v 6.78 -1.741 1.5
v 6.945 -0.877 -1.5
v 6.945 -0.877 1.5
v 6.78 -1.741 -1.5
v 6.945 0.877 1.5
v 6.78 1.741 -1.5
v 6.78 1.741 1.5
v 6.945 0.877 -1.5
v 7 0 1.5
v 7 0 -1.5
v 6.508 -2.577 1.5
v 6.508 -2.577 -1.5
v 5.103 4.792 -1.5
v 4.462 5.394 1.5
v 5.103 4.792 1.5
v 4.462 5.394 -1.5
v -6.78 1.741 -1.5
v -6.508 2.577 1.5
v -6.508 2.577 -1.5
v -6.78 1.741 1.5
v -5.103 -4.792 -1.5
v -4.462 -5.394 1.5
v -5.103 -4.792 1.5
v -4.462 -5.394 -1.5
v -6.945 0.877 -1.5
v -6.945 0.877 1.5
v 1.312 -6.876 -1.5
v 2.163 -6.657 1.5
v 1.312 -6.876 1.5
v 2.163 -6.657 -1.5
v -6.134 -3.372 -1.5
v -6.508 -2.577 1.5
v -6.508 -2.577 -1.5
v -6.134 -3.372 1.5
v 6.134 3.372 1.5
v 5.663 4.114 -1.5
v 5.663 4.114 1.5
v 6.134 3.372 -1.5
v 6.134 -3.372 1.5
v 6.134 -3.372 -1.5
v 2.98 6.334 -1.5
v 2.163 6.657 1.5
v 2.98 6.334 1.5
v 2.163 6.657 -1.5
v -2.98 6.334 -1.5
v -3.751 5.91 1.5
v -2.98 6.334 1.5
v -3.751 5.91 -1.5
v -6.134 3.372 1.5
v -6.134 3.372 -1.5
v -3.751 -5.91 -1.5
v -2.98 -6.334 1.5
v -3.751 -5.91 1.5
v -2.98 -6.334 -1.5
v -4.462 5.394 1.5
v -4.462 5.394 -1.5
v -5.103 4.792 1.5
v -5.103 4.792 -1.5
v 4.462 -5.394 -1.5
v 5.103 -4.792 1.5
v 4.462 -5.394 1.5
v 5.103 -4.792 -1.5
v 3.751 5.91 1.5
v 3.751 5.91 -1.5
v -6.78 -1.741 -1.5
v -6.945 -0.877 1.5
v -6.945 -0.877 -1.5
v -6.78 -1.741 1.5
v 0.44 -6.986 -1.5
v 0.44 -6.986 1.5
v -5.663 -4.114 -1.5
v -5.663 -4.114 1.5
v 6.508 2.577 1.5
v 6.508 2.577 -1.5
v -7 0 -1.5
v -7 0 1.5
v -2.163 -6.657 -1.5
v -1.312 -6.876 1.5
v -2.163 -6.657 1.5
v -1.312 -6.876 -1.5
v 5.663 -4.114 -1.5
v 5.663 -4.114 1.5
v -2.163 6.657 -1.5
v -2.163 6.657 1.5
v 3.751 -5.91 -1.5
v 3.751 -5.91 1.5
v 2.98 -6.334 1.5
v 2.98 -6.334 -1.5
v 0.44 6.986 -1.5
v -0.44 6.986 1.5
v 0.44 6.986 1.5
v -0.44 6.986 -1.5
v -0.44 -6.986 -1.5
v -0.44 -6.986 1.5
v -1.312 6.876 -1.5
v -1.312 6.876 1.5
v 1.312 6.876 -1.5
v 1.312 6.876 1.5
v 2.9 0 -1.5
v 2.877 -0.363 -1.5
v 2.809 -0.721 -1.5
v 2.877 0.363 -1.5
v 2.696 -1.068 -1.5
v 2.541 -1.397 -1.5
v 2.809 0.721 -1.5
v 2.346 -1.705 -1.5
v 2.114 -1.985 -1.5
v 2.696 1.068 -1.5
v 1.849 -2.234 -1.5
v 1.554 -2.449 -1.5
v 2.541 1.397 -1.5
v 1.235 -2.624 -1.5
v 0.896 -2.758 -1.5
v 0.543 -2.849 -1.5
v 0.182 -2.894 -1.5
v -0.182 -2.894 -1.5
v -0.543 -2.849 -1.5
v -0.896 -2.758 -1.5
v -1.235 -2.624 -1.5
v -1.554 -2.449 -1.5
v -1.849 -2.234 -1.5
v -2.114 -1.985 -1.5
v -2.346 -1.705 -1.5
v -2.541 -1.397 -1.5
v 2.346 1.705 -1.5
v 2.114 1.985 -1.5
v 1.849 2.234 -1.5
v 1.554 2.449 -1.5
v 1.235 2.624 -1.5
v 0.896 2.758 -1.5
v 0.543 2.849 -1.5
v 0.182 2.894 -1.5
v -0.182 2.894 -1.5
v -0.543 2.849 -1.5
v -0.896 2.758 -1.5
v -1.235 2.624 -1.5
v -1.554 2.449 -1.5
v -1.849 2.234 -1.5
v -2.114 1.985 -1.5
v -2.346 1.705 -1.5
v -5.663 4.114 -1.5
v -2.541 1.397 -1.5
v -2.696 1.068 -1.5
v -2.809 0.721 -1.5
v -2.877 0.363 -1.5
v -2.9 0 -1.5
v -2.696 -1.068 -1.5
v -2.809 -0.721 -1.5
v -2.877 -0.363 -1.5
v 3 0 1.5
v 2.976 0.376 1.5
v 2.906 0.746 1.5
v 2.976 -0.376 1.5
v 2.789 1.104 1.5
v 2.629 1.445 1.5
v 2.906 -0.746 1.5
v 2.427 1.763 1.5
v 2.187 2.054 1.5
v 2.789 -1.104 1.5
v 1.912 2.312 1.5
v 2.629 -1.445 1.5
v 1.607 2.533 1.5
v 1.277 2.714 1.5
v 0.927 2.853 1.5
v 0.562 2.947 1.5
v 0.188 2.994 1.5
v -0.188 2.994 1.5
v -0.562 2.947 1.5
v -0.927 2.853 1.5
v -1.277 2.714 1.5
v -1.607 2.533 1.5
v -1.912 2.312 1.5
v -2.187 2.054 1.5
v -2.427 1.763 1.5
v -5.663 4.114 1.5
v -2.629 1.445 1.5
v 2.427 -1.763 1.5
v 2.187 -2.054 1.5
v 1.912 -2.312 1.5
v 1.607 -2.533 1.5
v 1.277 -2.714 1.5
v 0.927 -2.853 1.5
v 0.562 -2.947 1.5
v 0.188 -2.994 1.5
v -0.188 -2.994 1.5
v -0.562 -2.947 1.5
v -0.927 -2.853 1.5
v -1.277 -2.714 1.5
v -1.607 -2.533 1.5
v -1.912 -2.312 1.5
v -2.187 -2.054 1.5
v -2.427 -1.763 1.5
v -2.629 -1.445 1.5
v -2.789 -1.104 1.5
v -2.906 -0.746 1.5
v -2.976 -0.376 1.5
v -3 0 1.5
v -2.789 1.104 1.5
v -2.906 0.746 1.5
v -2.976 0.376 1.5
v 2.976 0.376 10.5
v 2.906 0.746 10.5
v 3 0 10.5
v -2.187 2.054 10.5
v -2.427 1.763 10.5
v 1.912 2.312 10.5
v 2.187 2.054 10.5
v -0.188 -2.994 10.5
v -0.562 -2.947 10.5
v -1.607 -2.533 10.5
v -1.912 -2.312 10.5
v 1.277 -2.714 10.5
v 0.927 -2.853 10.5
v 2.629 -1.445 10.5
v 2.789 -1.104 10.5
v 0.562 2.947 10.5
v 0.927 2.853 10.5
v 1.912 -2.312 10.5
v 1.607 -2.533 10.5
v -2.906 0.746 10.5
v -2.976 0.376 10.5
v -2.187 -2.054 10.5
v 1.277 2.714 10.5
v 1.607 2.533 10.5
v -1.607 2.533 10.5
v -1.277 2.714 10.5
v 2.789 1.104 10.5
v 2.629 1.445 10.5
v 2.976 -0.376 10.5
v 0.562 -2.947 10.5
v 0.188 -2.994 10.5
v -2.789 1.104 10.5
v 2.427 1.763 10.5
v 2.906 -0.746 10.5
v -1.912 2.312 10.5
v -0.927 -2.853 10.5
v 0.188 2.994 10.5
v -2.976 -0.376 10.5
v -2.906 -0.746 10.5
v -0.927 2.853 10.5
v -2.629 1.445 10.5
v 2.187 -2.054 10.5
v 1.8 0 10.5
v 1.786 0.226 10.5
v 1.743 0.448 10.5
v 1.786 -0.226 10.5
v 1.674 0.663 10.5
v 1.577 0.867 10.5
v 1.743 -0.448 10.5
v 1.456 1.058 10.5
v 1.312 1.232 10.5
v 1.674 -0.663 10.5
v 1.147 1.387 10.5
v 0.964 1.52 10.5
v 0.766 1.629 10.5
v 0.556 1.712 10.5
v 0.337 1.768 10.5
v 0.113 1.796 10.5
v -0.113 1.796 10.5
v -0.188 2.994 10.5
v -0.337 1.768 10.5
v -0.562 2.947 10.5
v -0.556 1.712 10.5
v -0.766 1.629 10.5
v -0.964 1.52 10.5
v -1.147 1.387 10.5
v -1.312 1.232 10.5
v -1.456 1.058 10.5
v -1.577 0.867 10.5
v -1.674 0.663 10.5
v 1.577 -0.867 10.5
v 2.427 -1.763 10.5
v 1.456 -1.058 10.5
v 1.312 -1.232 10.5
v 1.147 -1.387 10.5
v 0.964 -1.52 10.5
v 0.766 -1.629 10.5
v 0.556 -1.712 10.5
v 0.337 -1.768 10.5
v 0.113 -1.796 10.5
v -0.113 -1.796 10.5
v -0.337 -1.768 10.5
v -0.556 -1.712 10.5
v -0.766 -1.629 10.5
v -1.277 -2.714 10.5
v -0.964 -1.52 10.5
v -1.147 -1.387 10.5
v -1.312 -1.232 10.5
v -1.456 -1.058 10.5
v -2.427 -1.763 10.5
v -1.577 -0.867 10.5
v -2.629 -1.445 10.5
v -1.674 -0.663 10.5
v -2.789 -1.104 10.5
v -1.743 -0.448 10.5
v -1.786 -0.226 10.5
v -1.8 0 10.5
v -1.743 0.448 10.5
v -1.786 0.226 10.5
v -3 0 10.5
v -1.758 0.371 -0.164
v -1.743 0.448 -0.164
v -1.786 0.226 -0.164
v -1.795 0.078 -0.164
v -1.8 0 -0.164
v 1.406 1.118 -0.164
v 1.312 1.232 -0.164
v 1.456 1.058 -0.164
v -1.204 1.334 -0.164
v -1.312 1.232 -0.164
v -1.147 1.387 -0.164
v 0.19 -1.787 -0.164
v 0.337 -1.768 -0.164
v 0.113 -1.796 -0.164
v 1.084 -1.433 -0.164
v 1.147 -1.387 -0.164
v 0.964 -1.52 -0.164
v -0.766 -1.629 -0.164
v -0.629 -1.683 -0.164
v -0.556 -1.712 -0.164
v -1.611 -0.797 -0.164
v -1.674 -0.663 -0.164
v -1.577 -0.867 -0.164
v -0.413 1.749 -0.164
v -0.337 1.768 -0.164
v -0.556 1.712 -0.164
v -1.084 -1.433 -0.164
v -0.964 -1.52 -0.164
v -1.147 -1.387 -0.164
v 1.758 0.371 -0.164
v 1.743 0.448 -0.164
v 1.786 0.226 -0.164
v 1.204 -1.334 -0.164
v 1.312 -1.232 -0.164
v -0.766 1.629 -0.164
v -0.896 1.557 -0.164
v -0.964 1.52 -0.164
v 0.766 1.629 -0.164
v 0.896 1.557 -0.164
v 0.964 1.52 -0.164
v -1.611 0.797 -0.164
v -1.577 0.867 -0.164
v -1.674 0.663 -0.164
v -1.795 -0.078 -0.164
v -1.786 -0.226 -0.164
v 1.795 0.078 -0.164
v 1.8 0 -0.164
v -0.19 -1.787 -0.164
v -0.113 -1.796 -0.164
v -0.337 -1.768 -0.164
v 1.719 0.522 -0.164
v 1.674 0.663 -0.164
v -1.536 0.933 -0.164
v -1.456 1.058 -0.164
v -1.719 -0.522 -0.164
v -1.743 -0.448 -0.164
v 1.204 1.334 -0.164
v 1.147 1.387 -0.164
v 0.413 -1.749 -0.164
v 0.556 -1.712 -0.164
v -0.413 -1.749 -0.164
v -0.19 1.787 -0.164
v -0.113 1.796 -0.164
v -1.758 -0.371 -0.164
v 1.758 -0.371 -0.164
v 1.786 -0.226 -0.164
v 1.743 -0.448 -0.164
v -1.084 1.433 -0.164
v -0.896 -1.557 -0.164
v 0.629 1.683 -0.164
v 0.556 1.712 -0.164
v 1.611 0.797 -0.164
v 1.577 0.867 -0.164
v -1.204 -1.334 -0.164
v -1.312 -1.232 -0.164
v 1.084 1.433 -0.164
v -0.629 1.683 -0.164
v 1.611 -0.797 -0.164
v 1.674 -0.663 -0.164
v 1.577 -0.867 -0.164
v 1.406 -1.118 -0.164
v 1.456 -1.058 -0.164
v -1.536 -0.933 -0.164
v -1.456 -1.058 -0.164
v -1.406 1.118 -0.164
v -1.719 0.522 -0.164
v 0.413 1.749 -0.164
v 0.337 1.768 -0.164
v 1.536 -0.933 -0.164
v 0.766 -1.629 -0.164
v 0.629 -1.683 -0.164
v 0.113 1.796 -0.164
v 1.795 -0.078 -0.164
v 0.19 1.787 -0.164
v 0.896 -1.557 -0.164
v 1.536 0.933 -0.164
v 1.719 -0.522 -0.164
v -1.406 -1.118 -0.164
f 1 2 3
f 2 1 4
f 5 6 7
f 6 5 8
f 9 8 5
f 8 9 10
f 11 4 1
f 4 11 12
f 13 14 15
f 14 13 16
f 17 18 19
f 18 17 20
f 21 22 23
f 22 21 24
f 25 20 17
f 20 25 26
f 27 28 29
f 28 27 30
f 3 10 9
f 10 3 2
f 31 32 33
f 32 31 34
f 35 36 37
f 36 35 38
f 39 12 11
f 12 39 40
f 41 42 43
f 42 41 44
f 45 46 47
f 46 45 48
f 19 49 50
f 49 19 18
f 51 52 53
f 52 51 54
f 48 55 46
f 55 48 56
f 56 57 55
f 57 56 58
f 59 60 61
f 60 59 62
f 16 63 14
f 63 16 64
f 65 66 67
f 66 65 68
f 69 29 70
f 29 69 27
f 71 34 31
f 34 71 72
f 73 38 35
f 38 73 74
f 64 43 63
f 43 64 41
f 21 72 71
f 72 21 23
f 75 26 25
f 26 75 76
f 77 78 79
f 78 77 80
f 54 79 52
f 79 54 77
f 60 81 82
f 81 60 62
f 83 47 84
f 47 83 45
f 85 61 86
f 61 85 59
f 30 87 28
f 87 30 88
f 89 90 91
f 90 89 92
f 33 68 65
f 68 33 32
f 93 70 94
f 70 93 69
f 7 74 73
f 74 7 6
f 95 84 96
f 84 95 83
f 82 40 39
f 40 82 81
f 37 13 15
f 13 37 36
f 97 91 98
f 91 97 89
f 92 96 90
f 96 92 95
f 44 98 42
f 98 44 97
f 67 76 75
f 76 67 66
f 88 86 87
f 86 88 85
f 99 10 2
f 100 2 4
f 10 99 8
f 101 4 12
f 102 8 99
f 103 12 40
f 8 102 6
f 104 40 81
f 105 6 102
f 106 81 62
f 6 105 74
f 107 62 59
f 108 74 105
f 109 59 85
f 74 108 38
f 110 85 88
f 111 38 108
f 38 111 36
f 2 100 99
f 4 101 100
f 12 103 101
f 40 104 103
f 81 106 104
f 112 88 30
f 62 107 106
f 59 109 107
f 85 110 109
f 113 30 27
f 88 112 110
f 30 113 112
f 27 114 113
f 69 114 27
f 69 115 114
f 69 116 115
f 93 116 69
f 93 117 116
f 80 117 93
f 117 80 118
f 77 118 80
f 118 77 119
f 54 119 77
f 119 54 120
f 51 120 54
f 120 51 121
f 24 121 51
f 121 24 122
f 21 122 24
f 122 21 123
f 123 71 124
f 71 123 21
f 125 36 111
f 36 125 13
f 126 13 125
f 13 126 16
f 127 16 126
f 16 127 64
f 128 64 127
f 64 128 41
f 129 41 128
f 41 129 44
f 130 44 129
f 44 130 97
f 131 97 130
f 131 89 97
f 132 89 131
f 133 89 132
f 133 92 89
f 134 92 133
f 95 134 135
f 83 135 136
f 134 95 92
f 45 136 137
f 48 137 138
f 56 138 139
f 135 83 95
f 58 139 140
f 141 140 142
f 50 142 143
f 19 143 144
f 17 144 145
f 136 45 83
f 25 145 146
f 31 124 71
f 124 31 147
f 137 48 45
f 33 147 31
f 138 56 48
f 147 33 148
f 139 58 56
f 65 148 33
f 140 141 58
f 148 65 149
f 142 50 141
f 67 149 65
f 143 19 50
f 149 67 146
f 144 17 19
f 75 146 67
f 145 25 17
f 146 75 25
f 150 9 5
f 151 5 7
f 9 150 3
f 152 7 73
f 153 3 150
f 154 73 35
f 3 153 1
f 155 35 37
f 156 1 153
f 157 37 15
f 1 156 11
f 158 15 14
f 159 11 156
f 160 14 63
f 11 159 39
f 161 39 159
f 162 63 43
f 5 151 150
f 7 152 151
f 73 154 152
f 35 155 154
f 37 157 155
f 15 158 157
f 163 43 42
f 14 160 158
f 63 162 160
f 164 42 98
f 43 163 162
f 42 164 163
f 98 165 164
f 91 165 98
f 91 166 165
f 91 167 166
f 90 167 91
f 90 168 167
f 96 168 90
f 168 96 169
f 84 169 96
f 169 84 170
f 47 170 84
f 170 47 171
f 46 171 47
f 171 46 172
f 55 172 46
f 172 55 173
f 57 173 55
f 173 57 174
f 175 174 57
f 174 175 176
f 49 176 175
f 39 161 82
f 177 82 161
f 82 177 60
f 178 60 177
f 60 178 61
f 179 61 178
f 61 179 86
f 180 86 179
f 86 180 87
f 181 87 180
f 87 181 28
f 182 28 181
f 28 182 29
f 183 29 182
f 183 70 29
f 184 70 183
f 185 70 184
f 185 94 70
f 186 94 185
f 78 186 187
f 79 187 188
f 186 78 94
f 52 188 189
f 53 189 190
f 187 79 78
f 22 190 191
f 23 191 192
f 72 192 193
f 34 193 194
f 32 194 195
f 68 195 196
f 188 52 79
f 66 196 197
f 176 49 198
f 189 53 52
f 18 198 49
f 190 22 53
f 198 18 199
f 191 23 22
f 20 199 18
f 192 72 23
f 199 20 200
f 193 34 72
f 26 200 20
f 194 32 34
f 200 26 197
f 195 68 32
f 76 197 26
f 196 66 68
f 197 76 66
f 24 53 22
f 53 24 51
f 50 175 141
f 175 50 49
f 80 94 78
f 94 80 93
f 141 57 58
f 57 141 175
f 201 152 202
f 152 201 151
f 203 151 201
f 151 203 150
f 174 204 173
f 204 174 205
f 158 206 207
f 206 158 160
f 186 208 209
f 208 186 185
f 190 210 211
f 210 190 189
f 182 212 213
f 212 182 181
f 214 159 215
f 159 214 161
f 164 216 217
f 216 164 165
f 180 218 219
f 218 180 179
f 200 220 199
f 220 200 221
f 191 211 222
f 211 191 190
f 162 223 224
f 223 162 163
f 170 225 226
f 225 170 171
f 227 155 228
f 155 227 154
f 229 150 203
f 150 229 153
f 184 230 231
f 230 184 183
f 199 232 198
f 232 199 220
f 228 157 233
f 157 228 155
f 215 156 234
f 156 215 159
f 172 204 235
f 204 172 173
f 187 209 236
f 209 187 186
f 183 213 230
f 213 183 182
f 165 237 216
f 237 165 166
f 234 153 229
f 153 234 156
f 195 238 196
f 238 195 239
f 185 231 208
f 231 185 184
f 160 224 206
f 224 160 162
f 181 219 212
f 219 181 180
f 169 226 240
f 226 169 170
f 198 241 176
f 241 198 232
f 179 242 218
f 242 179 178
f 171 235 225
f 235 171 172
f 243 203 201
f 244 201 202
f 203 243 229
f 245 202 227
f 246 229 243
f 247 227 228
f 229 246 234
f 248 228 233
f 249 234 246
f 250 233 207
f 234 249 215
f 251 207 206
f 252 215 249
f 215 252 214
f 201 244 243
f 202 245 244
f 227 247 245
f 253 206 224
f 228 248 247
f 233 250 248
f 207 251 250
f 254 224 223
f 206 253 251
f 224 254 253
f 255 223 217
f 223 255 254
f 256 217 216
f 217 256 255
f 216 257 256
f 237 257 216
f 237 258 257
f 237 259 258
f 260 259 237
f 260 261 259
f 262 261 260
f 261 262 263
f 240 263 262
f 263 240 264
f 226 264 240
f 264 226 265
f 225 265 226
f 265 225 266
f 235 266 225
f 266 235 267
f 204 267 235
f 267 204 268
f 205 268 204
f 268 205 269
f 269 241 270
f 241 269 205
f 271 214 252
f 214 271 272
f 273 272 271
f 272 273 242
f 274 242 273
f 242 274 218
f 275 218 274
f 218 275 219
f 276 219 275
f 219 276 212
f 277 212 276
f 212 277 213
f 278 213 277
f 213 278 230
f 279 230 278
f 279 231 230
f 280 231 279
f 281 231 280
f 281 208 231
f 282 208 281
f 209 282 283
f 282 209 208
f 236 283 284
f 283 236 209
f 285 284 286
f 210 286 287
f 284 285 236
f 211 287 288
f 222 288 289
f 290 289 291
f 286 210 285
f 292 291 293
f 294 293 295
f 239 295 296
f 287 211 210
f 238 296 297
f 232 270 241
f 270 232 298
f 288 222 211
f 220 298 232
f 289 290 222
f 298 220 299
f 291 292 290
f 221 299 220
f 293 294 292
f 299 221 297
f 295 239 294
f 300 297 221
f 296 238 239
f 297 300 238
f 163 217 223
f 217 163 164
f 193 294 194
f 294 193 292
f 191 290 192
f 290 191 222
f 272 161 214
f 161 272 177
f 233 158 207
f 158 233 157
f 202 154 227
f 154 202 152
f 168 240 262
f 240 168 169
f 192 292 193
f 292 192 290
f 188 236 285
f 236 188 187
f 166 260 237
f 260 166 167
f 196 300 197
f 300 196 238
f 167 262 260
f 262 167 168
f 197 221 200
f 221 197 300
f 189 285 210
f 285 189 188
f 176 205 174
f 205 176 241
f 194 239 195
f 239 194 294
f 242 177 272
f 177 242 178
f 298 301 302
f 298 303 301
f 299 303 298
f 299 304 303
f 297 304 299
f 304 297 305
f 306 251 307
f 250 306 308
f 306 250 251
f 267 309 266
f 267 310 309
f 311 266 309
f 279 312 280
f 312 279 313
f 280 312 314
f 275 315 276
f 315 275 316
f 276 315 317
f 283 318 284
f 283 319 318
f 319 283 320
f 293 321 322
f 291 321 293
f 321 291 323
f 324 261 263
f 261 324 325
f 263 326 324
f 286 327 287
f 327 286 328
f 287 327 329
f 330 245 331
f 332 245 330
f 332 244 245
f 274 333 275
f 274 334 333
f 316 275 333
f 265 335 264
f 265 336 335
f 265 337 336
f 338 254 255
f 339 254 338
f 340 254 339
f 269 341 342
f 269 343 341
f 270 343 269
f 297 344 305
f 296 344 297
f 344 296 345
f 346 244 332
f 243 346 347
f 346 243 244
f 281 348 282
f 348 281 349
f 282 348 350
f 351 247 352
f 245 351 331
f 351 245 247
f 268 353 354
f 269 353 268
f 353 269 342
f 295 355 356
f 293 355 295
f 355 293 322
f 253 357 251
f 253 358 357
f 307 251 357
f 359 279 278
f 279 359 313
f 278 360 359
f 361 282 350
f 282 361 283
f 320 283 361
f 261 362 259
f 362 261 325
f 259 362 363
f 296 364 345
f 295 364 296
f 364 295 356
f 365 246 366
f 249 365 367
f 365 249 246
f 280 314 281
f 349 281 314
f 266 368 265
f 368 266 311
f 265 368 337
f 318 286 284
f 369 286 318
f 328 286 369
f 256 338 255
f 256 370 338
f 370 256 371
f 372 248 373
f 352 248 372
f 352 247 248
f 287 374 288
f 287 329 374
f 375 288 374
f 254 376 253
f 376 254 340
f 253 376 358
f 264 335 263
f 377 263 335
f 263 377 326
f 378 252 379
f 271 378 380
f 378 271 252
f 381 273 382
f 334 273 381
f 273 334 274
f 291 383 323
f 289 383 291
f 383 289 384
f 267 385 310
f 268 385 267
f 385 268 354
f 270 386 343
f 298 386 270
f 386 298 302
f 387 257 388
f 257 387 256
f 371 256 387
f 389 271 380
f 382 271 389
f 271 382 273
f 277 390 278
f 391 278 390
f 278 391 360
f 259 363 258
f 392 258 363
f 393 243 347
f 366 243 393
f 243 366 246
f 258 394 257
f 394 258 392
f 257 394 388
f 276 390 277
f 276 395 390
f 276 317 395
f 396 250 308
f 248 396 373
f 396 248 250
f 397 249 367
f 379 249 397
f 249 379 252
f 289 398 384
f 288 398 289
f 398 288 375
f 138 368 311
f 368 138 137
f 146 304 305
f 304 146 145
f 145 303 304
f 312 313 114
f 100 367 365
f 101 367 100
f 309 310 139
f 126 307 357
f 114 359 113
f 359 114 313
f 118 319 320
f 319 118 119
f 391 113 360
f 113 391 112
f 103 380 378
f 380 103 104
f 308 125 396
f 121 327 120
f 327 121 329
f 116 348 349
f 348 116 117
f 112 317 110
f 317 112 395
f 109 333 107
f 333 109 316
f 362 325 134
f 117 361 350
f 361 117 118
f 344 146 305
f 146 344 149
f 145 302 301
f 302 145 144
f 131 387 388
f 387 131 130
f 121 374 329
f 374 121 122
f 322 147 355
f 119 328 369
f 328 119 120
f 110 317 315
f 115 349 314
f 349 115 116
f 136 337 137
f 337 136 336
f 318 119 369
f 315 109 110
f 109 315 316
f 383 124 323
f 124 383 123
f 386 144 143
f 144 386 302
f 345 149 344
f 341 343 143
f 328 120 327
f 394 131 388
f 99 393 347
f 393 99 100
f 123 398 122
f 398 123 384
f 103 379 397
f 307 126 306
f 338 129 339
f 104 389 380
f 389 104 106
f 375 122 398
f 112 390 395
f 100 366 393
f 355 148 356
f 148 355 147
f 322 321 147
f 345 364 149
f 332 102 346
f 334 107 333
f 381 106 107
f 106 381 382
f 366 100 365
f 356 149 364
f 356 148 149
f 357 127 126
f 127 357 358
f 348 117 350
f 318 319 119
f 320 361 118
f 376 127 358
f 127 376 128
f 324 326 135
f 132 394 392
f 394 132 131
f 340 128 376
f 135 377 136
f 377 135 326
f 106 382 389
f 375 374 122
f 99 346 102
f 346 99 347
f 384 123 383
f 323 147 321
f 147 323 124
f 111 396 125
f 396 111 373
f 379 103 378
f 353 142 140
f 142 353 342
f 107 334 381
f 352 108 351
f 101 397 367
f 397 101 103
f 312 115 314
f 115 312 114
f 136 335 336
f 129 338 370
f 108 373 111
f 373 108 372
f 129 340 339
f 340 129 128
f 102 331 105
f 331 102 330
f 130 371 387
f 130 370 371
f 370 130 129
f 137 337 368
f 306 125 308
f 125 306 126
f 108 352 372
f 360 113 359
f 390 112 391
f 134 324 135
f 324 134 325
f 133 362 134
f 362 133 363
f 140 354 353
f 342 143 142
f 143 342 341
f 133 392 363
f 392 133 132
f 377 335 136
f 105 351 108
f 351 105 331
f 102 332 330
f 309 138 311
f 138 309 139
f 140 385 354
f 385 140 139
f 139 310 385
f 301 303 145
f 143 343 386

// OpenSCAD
$fn = 50;


difference() {
	union() {
		translate(v = [0, 0, -1.5000000000]) {
			cylinder(h = 3, r = 7.0000000000);
		}
		translate(v = [0, 0, -1.5000000000]) {
			cylinder(h = 12, r = 3.0000000000);
		}
	}
	union() {
		translate(v = [0, 0, -1.5000000000]) {
			rotate(a = [0, 180, 0]) {
				difference() {
					union() {
						translate(v = [0, 0, -12.0000000000]) {
							cylinder(h = 12, r = 1.5000000000);
						}
						translate(v = [0, 0, -12.0000000000]) {
							cylinder(h = 12, r = 1.8000000000);
						}
						translate(v = [0, 0, -1.7000000000]) {
							cylinder(h = 1.7000000000, r1 = 1.5000000000, r2 = 2.9000000000);
						}
						translate(v = [0, 0, -12.0000000000]) {
							cylinder(h = 12, r = 1.5000000000);
						}
					}
					union();
				}
			}
		}
		translate(v = [0, 0, -100.0000000000]) {
			cylinder(h = 200, r = 1.5000000000);
		}
	}
}
